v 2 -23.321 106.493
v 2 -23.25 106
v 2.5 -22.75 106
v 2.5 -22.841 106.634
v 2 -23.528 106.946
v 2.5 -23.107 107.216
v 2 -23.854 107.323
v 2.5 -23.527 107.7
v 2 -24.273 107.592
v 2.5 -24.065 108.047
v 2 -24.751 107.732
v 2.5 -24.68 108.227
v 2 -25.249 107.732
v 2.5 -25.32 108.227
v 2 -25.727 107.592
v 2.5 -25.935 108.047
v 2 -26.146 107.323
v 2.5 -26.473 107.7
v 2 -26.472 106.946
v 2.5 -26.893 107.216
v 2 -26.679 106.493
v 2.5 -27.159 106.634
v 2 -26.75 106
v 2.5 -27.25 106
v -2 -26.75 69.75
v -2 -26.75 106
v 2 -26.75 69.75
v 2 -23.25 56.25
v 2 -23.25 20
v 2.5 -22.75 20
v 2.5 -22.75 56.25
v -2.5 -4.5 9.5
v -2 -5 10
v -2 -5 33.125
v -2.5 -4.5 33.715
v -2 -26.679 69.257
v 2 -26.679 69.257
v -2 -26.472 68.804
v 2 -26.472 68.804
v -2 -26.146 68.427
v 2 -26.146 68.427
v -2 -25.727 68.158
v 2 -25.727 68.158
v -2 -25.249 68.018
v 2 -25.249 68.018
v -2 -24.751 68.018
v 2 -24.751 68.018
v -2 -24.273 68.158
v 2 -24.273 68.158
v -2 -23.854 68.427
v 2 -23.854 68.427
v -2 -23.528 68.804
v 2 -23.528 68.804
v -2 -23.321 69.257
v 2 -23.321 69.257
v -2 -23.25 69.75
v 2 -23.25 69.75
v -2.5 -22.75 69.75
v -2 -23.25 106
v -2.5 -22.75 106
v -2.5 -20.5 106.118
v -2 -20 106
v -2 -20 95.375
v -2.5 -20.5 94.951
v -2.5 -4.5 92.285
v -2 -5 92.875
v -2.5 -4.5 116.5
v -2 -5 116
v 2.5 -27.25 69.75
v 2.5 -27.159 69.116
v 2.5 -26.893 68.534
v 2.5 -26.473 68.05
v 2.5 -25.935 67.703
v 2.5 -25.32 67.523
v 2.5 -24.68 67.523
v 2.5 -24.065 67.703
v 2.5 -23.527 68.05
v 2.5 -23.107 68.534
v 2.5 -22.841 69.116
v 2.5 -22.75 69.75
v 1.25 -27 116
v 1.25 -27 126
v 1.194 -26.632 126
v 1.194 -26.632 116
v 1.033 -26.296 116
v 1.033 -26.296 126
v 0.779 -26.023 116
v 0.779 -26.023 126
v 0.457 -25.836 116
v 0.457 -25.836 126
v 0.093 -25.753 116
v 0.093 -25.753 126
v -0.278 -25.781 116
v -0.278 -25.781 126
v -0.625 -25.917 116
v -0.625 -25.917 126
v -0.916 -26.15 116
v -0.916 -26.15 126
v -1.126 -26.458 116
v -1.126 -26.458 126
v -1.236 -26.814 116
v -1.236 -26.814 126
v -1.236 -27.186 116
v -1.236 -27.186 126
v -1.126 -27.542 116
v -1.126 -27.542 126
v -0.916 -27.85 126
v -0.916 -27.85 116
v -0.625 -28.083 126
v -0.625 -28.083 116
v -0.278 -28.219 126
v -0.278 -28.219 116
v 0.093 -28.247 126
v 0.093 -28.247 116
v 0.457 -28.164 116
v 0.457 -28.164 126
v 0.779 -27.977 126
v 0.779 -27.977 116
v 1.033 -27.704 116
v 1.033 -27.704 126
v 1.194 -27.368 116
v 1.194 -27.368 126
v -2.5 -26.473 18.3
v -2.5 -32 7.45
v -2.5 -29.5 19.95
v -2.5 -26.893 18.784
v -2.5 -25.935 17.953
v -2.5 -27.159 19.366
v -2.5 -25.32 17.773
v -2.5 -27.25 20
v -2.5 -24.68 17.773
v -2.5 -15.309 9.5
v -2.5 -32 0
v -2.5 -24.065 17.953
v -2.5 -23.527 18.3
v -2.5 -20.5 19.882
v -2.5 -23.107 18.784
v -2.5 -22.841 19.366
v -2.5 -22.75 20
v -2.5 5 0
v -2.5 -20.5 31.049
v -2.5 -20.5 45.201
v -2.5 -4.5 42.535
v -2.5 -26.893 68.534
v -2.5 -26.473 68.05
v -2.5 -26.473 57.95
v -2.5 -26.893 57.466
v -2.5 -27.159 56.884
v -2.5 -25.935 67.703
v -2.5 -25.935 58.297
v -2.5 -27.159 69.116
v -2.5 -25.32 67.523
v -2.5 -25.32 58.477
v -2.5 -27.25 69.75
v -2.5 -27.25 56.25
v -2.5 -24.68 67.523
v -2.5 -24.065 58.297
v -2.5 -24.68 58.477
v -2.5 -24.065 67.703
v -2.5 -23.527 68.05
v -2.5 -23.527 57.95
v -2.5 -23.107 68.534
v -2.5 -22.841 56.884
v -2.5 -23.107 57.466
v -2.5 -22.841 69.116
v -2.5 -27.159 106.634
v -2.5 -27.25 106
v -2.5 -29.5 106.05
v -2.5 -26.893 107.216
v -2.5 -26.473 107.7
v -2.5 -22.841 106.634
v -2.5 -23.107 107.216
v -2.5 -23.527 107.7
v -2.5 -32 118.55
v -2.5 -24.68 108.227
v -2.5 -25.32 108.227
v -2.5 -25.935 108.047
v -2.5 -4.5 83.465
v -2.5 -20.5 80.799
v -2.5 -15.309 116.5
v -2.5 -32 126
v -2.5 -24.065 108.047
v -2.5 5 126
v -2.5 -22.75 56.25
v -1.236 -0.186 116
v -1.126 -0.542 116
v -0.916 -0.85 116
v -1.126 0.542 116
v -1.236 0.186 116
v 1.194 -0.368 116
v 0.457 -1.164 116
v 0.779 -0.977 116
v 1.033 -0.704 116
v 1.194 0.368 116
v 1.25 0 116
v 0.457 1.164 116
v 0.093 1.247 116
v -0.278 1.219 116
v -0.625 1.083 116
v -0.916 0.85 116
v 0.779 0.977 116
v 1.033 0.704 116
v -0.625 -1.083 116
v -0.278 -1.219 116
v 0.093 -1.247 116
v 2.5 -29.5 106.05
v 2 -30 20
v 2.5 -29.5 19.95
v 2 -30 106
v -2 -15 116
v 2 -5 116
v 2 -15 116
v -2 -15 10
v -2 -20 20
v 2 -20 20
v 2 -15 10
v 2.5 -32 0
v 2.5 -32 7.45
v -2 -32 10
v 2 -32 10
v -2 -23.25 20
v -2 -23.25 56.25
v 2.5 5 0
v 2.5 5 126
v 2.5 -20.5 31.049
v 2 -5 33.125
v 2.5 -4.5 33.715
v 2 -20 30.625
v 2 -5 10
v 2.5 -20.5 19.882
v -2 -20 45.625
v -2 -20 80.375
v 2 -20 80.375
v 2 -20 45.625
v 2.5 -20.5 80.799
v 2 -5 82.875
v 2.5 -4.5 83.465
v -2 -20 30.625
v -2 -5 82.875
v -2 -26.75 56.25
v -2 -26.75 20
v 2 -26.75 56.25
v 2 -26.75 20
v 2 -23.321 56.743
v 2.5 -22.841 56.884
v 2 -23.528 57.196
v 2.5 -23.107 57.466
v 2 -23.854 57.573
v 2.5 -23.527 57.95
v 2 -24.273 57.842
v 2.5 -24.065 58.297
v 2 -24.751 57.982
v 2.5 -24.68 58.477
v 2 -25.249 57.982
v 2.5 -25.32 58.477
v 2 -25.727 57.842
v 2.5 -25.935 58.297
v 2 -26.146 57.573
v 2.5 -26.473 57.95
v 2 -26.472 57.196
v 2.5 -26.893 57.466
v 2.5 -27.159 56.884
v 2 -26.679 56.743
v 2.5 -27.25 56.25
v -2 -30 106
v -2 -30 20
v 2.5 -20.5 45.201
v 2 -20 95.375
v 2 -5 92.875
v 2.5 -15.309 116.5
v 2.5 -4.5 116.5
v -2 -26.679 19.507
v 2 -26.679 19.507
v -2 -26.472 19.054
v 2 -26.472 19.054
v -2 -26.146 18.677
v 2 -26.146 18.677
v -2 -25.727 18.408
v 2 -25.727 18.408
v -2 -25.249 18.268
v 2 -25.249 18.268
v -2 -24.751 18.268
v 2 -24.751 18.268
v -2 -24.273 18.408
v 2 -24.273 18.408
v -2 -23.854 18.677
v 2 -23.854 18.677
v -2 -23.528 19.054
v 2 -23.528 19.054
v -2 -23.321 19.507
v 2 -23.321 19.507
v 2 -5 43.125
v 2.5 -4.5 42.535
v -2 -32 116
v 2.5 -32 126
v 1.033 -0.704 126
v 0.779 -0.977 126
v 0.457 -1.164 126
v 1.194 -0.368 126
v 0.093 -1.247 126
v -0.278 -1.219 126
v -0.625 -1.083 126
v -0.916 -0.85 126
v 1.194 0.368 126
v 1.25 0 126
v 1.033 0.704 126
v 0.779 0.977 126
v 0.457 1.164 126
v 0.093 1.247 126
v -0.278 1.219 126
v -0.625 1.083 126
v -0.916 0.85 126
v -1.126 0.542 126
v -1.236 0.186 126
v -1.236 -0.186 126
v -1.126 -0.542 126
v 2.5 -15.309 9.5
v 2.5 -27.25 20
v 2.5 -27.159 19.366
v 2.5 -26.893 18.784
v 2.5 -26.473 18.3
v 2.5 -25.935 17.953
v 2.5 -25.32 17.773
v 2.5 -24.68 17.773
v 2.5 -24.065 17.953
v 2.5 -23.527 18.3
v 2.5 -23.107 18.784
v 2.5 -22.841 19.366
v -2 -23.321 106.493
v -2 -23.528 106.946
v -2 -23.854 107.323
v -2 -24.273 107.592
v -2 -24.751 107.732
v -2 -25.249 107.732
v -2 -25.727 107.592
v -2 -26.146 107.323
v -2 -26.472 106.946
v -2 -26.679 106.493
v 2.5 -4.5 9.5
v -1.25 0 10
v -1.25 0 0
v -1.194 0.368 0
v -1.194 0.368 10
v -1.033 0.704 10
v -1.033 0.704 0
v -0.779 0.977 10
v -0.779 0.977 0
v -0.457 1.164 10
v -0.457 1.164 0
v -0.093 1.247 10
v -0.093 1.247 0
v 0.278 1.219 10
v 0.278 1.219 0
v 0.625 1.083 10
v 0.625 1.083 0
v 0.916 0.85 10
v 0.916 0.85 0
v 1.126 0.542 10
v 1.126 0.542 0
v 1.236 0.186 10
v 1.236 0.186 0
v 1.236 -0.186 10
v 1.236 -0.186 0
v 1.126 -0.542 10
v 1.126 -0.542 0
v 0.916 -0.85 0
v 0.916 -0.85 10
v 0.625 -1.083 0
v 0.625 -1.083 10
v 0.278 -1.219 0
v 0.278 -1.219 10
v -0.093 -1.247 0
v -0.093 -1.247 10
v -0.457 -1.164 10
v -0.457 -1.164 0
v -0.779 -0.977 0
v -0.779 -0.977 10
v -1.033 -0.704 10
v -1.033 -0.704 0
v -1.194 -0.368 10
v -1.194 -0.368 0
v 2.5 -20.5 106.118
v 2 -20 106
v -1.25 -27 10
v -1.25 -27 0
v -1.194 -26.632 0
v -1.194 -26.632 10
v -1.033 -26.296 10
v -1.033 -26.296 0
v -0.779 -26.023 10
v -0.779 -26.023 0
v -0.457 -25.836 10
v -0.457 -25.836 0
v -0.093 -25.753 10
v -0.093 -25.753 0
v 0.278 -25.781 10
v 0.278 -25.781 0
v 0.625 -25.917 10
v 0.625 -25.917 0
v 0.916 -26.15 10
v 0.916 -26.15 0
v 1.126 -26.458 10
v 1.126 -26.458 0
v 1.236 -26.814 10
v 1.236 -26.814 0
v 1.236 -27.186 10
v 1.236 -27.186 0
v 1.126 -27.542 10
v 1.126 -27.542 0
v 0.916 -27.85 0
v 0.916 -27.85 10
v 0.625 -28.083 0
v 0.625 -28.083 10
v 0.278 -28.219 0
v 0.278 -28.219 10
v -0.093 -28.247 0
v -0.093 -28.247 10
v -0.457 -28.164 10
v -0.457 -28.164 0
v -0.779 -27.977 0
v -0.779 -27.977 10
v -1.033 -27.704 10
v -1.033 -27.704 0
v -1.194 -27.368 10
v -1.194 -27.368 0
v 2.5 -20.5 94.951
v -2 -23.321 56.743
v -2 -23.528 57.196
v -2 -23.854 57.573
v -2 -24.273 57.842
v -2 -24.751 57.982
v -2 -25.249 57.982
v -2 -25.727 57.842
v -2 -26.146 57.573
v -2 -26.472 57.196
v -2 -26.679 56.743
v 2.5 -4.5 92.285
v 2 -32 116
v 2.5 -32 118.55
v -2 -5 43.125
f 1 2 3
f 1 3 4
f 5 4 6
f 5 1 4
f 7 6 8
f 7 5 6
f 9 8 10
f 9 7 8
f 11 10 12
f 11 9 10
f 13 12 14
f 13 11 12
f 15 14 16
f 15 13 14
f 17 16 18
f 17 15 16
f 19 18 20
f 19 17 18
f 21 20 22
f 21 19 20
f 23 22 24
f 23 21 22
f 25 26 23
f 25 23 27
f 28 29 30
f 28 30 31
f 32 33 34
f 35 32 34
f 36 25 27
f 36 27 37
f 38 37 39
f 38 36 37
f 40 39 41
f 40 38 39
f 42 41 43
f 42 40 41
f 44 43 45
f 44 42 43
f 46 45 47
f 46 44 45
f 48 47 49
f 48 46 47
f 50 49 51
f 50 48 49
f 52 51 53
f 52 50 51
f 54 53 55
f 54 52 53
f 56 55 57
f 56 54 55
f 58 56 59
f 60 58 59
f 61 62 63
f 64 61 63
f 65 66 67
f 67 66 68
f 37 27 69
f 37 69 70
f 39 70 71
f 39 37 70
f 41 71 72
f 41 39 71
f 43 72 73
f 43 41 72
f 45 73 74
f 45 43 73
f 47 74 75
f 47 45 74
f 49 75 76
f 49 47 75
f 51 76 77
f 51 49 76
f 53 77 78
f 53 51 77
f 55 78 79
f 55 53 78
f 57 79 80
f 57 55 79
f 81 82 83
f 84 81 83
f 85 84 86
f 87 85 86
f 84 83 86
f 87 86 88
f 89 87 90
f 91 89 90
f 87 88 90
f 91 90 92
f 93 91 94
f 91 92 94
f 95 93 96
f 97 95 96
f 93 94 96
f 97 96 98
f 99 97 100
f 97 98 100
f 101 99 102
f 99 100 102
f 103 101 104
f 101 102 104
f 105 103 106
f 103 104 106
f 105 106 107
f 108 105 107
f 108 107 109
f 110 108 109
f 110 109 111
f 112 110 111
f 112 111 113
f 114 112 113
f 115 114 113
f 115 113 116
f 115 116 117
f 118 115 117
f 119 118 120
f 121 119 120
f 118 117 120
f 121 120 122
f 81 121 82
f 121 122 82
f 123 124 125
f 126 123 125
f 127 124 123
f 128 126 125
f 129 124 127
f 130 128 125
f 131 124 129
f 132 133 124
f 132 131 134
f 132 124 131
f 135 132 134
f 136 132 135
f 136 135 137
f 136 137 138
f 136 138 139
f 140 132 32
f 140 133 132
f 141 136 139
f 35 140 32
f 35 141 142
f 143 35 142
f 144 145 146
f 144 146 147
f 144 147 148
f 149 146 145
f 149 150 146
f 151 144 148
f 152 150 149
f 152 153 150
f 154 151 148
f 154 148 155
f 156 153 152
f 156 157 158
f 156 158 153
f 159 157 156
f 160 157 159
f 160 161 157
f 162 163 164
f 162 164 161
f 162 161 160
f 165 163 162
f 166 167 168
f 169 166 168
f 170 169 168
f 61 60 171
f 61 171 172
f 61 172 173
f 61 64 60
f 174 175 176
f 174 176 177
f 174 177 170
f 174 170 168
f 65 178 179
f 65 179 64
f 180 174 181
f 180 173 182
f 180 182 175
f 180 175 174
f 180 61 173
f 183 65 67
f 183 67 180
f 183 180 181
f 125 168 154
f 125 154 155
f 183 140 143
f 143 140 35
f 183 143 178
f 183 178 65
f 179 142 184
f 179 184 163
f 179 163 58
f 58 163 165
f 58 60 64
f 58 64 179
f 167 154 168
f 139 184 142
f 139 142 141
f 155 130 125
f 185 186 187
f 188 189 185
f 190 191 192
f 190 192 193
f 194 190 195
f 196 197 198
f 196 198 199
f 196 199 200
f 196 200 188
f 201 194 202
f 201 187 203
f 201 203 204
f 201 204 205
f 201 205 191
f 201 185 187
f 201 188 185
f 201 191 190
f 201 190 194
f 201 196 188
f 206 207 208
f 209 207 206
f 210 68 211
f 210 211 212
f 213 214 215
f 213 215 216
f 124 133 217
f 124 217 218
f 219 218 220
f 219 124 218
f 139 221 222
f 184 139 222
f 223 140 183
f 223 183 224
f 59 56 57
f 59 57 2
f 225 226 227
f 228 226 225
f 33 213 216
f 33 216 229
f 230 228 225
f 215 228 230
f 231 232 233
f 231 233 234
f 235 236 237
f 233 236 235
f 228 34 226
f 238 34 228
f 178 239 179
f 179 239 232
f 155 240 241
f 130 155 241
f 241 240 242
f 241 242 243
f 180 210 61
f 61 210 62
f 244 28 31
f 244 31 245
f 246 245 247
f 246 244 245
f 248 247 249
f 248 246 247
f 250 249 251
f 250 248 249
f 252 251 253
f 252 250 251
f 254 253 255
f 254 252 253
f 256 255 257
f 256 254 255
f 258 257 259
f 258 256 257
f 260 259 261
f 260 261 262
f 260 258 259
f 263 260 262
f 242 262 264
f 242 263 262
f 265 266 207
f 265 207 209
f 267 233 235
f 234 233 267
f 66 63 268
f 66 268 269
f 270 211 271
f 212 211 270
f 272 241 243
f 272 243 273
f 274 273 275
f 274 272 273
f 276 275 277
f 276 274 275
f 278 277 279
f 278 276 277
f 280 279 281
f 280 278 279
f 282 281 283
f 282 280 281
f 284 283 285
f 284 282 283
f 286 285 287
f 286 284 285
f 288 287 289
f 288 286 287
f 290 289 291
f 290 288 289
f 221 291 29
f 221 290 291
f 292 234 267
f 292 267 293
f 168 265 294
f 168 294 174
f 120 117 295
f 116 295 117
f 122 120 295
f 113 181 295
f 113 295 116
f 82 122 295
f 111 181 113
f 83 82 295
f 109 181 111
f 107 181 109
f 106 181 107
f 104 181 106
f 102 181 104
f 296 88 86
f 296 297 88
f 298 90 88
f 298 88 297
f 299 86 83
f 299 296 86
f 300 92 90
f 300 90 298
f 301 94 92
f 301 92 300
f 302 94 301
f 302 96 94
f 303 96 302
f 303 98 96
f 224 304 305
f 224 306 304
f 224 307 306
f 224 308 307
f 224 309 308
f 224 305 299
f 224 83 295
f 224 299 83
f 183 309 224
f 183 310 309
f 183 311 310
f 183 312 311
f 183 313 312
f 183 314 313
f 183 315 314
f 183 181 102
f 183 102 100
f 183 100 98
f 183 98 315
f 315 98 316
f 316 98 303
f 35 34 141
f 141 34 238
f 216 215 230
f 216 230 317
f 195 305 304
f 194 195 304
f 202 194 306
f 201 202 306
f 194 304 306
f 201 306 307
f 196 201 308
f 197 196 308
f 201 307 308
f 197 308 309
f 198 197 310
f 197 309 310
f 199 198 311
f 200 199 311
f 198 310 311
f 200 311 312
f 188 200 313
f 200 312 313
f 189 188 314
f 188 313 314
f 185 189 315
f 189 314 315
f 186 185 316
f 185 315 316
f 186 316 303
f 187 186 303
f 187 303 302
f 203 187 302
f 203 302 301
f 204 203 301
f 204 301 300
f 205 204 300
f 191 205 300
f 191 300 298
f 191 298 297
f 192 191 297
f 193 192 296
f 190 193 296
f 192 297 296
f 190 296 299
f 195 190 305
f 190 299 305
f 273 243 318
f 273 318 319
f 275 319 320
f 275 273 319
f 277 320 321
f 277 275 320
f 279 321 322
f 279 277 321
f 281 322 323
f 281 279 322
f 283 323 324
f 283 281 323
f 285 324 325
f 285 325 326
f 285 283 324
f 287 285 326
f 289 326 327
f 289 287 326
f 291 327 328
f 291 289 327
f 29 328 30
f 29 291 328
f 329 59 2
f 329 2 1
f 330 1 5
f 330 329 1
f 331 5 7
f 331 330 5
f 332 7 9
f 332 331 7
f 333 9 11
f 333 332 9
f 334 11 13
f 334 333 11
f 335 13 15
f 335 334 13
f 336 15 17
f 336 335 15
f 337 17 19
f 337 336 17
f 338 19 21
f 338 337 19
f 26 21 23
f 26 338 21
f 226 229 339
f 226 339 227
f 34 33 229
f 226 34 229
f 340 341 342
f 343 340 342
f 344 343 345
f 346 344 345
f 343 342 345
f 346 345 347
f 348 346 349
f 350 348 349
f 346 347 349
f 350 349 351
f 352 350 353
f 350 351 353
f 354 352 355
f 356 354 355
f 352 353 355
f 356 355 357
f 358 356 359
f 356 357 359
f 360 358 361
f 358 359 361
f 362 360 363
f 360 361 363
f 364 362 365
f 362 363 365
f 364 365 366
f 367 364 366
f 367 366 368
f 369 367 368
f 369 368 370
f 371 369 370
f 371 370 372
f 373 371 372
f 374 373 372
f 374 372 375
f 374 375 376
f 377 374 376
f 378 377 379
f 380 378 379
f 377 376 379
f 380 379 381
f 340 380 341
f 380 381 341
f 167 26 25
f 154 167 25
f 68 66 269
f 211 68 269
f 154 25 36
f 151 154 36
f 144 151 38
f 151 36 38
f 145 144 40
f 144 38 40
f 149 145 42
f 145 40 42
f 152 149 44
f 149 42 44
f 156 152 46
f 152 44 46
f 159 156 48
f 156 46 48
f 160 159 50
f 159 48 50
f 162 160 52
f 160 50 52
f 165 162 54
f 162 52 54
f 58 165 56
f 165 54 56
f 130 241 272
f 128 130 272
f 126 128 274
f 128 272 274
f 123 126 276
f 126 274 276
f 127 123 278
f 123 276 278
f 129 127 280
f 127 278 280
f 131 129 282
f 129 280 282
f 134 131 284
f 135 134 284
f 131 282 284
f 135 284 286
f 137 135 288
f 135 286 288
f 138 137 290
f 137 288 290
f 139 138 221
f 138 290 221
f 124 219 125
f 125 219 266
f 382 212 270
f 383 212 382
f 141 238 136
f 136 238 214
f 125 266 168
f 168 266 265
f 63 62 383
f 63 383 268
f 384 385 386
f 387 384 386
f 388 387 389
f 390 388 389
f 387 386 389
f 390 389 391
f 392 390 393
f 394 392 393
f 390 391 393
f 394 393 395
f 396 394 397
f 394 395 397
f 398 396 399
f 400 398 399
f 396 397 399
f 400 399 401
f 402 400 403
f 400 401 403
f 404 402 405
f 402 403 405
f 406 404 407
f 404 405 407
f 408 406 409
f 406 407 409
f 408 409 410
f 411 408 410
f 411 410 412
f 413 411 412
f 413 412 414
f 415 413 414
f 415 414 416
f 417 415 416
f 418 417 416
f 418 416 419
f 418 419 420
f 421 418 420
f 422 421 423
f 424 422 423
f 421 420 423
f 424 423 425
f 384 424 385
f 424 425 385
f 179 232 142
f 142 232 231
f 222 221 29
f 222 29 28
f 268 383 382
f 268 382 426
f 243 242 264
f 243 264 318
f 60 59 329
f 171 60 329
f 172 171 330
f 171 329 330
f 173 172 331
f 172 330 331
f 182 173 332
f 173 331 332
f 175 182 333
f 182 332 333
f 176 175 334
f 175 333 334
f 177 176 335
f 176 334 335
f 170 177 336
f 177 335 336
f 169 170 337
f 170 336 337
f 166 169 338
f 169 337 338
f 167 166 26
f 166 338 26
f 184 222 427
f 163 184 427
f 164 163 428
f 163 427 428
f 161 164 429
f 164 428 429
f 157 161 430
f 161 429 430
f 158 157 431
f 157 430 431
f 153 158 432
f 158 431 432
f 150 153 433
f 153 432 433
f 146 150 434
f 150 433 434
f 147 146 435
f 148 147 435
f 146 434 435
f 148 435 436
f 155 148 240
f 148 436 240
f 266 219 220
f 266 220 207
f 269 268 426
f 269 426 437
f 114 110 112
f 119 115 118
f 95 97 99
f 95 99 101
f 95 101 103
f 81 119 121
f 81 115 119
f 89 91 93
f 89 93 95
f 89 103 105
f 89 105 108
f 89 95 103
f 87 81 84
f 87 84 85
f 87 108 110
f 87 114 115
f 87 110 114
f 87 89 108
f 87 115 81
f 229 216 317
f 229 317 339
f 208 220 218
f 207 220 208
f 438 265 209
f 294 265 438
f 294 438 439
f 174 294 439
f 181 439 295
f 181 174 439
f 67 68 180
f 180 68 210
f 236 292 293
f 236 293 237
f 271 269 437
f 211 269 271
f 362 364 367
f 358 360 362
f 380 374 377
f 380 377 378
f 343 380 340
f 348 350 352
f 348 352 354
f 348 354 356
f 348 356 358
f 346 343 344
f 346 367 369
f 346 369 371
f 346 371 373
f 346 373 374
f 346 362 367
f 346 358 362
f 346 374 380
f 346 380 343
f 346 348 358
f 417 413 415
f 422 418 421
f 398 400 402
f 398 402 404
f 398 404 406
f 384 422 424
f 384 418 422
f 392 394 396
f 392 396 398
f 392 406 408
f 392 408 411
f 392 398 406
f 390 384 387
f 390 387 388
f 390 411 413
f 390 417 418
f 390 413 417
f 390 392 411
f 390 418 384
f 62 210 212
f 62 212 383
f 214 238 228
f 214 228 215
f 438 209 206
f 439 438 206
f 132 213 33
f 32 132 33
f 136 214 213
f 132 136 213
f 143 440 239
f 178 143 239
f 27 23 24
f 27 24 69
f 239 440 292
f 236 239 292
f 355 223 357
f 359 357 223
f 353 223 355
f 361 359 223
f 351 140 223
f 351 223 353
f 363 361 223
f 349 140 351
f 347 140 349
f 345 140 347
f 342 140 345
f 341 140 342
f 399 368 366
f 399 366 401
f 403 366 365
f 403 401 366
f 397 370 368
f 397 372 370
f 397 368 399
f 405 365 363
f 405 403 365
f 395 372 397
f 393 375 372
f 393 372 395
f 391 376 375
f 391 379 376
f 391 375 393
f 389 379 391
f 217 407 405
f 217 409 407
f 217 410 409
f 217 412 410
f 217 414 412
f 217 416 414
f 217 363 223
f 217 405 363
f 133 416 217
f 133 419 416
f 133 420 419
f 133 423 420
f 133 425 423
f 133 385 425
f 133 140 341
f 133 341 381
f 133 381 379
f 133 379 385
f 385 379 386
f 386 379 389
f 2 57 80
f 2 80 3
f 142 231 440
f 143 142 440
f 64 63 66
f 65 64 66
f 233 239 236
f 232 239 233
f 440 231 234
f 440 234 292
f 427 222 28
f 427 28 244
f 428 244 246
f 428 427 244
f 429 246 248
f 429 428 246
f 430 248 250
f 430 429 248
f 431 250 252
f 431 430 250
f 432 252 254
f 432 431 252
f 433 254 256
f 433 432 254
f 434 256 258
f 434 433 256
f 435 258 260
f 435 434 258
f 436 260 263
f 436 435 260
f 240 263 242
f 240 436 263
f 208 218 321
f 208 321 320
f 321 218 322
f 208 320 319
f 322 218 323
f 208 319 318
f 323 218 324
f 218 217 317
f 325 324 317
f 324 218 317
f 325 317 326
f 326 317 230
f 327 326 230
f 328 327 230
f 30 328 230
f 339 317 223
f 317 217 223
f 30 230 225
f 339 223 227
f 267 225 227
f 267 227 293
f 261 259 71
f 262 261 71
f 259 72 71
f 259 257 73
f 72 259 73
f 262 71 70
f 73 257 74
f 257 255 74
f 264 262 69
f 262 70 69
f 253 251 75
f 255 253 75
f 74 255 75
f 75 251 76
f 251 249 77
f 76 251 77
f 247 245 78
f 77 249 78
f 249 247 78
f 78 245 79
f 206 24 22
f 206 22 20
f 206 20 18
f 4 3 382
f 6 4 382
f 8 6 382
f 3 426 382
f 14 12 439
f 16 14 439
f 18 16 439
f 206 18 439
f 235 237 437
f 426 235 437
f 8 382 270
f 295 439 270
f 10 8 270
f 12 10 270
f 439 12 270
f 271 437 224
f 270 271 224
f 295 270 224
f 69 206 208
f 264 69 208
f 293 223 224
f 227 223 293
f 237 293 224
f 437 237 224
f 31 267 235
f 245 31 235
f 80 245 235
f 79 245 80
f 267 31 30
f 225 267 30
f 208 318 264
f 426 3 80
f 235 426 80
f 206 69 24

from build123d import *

# Parameters (mm, degrees)
CROQUIS1_W              = 5
CROQUIS1_H              = 10
SALIENTE_EXTRUIR1_DEPTH = 126
SALIENTE_EXTRUIR2_DEPTH = 5
CROQUIS2_R              = 1.25
CORTAR_EXTRUIR1_DEPTH   = 10
CROQUIS3_R              = 1.25
CORTAR_EXTRUIR2_DEPTH   = 10
CHAFL_N1_SIZE           = 0.5


with BuildPart() as part:
    # Croquis1 → Saliente-Extruir1 (new body)
    with BuildSketch(Plane.XY):
        Rectangle(CROQUIS1_W, CROQUIS1_H)
    extrude(amount=SALIENTE_EXTRUIR1_DEPTH)

    # Croquis4 → Saliente-Extruir2 (add)
    with BuildSketch(Plane.ZY.offset(2.5)):
        Polygon((0, -5), (0, -32), (10, -32), (20, -30), (106, -30), (116, -32), (126, -32), (126, -5), (116, -5), (116, -15), (106, -20), (95.375, -20), (92.875, -5), (82.875, -5), (80.375, -20), (45.625, -20), (43.125, -5), (33.125, -5), (30.625, -20), (20, -20), (10, -15), (10, -5), align=None)
        with BuildLine():
            Line((20, -23.25), (56.25, -23.25))
            ThreePointArc((56.25, -23.25), (58, -25), (56.25, -26.75))
            Line((56.25, -26.75), (20, -26.75))
            ThreePointArc((20, -26.75), (18.25, -25), (20, -23.25))
        make_face(mode=Mode.SUBTRACT)
        with BuildLine():
            Line((69.75, -23.25), (106, -23.25))
            ThreePointArc((106, -23.25), (107.75, -25), (106, -26.75))
            Line((106, -26.75), (69.75, -26.75))
            ThreePointArc((69.75, -26.75), (68, -25), (69.75, -23.25))
        make_face(mode=Mode.SUBTRACT)
    extrude(amount=-SALIENTE_EXTRUIR2_DEPTH)

    # Croquis2 → Cortar-Extruir1 (cut)
    with BuildSketch(Plane.XY.offset(126)):
        Circle(CROQUIS2_R)
        with Locations((0, -27)):
            Circle(CROQUIS2_R)
    extrude(amount=-CORTAR_EXTRUIR1_DEPTH, mode=Mode.SUBTRACT)

    # Croquis3 → Cortar-Extruir2 (cut)
    with BuildSketch(Plane(origin=(0, 0, 0), x_dir=(-1, 0, 0), z_dir=(0, 0, -1))):
        Circle(CROQUIS3_R)
        with Locations((0, -27)):
            Circle(CROQUIS3_R)
    extrude(amount=-CORTAR_EXTRUIR2_DEPTH, mode=Mode.SUBTRACT)

    # Chaflán1
    chafl_n1_edges = [part.edges().sort_by_distance(p)[0] for p in [
        (2.5, -5, 104.4375),
        (2.5, -5, 63),
        (2.5, -5, 21.5625),
        (-2.5, -5, 104.4375),
        (-2.5, -5, 63),
        (-2.5, -5, 21.5625),
        (2.5, -10, 10),
        (2.5, -17.5, 15),
        (2.5, -20, 25.3125),
        (2.5, -12.5, 31.875),
        (2.5, -12.5, 44.375),
        (2.5, -20, 63),
        (2.5, -12.5, 81.625),
        (2.5, -12.5, 94.125),
        (2.5, -20, 100.6875),
        (2.5, -17.5, 111),
        (2.5, -10, 116),
        (2.5, -31, 111),
        (2.5, -30, 63),
        (2.5, -31, 15),
        (2.5, -25, 18.25),
        (2.5, -26.75, 38.125),
        (2.5, -25, 58),
        (2.5, -23.25, 38.125),
        (2.5, -25, 68),
        (2.5, -26.75, 87.875),
        (2.5, -25, 107.75),
        (2.5, -23.25, 87.875),
        (-2.5, -31, 15),
        (-2.5, -30, 63),
        (-2.5, -31, 111),
        (-2.5, -10, 116),
        (-2.5, -17.5, 111),
        (-2.5, -20, 100.6875),
        (-2.5, -12.5, 94.125),
        (-2.5, -12.5, 81.625),
        (-2.5, -20, 63),
        (-2.5, -12.5, 44.375),
        (-2.5, -12.5, 31.875),
        (-2.5, -20, 25.3125),
        (-2.5, -17.5, 15),
        (-2.5, -10, 10),
        (-2.5, -25, 68),
        (-2.5, -23.25, 87.875),
        (-2.5, -25, 107.75),
        (-2.5, -26.75, 87.875),
        (-2.5, -25, 18.25),
        (-2.5, -23.25, 38.125),
        (-2.5, -25, 58),
        (-2.5, -26.75, 38.125),
    ]]
    chamfer(chafl_n1_edges, length=CHAFL_N1_SIZE)


solid = part.part
